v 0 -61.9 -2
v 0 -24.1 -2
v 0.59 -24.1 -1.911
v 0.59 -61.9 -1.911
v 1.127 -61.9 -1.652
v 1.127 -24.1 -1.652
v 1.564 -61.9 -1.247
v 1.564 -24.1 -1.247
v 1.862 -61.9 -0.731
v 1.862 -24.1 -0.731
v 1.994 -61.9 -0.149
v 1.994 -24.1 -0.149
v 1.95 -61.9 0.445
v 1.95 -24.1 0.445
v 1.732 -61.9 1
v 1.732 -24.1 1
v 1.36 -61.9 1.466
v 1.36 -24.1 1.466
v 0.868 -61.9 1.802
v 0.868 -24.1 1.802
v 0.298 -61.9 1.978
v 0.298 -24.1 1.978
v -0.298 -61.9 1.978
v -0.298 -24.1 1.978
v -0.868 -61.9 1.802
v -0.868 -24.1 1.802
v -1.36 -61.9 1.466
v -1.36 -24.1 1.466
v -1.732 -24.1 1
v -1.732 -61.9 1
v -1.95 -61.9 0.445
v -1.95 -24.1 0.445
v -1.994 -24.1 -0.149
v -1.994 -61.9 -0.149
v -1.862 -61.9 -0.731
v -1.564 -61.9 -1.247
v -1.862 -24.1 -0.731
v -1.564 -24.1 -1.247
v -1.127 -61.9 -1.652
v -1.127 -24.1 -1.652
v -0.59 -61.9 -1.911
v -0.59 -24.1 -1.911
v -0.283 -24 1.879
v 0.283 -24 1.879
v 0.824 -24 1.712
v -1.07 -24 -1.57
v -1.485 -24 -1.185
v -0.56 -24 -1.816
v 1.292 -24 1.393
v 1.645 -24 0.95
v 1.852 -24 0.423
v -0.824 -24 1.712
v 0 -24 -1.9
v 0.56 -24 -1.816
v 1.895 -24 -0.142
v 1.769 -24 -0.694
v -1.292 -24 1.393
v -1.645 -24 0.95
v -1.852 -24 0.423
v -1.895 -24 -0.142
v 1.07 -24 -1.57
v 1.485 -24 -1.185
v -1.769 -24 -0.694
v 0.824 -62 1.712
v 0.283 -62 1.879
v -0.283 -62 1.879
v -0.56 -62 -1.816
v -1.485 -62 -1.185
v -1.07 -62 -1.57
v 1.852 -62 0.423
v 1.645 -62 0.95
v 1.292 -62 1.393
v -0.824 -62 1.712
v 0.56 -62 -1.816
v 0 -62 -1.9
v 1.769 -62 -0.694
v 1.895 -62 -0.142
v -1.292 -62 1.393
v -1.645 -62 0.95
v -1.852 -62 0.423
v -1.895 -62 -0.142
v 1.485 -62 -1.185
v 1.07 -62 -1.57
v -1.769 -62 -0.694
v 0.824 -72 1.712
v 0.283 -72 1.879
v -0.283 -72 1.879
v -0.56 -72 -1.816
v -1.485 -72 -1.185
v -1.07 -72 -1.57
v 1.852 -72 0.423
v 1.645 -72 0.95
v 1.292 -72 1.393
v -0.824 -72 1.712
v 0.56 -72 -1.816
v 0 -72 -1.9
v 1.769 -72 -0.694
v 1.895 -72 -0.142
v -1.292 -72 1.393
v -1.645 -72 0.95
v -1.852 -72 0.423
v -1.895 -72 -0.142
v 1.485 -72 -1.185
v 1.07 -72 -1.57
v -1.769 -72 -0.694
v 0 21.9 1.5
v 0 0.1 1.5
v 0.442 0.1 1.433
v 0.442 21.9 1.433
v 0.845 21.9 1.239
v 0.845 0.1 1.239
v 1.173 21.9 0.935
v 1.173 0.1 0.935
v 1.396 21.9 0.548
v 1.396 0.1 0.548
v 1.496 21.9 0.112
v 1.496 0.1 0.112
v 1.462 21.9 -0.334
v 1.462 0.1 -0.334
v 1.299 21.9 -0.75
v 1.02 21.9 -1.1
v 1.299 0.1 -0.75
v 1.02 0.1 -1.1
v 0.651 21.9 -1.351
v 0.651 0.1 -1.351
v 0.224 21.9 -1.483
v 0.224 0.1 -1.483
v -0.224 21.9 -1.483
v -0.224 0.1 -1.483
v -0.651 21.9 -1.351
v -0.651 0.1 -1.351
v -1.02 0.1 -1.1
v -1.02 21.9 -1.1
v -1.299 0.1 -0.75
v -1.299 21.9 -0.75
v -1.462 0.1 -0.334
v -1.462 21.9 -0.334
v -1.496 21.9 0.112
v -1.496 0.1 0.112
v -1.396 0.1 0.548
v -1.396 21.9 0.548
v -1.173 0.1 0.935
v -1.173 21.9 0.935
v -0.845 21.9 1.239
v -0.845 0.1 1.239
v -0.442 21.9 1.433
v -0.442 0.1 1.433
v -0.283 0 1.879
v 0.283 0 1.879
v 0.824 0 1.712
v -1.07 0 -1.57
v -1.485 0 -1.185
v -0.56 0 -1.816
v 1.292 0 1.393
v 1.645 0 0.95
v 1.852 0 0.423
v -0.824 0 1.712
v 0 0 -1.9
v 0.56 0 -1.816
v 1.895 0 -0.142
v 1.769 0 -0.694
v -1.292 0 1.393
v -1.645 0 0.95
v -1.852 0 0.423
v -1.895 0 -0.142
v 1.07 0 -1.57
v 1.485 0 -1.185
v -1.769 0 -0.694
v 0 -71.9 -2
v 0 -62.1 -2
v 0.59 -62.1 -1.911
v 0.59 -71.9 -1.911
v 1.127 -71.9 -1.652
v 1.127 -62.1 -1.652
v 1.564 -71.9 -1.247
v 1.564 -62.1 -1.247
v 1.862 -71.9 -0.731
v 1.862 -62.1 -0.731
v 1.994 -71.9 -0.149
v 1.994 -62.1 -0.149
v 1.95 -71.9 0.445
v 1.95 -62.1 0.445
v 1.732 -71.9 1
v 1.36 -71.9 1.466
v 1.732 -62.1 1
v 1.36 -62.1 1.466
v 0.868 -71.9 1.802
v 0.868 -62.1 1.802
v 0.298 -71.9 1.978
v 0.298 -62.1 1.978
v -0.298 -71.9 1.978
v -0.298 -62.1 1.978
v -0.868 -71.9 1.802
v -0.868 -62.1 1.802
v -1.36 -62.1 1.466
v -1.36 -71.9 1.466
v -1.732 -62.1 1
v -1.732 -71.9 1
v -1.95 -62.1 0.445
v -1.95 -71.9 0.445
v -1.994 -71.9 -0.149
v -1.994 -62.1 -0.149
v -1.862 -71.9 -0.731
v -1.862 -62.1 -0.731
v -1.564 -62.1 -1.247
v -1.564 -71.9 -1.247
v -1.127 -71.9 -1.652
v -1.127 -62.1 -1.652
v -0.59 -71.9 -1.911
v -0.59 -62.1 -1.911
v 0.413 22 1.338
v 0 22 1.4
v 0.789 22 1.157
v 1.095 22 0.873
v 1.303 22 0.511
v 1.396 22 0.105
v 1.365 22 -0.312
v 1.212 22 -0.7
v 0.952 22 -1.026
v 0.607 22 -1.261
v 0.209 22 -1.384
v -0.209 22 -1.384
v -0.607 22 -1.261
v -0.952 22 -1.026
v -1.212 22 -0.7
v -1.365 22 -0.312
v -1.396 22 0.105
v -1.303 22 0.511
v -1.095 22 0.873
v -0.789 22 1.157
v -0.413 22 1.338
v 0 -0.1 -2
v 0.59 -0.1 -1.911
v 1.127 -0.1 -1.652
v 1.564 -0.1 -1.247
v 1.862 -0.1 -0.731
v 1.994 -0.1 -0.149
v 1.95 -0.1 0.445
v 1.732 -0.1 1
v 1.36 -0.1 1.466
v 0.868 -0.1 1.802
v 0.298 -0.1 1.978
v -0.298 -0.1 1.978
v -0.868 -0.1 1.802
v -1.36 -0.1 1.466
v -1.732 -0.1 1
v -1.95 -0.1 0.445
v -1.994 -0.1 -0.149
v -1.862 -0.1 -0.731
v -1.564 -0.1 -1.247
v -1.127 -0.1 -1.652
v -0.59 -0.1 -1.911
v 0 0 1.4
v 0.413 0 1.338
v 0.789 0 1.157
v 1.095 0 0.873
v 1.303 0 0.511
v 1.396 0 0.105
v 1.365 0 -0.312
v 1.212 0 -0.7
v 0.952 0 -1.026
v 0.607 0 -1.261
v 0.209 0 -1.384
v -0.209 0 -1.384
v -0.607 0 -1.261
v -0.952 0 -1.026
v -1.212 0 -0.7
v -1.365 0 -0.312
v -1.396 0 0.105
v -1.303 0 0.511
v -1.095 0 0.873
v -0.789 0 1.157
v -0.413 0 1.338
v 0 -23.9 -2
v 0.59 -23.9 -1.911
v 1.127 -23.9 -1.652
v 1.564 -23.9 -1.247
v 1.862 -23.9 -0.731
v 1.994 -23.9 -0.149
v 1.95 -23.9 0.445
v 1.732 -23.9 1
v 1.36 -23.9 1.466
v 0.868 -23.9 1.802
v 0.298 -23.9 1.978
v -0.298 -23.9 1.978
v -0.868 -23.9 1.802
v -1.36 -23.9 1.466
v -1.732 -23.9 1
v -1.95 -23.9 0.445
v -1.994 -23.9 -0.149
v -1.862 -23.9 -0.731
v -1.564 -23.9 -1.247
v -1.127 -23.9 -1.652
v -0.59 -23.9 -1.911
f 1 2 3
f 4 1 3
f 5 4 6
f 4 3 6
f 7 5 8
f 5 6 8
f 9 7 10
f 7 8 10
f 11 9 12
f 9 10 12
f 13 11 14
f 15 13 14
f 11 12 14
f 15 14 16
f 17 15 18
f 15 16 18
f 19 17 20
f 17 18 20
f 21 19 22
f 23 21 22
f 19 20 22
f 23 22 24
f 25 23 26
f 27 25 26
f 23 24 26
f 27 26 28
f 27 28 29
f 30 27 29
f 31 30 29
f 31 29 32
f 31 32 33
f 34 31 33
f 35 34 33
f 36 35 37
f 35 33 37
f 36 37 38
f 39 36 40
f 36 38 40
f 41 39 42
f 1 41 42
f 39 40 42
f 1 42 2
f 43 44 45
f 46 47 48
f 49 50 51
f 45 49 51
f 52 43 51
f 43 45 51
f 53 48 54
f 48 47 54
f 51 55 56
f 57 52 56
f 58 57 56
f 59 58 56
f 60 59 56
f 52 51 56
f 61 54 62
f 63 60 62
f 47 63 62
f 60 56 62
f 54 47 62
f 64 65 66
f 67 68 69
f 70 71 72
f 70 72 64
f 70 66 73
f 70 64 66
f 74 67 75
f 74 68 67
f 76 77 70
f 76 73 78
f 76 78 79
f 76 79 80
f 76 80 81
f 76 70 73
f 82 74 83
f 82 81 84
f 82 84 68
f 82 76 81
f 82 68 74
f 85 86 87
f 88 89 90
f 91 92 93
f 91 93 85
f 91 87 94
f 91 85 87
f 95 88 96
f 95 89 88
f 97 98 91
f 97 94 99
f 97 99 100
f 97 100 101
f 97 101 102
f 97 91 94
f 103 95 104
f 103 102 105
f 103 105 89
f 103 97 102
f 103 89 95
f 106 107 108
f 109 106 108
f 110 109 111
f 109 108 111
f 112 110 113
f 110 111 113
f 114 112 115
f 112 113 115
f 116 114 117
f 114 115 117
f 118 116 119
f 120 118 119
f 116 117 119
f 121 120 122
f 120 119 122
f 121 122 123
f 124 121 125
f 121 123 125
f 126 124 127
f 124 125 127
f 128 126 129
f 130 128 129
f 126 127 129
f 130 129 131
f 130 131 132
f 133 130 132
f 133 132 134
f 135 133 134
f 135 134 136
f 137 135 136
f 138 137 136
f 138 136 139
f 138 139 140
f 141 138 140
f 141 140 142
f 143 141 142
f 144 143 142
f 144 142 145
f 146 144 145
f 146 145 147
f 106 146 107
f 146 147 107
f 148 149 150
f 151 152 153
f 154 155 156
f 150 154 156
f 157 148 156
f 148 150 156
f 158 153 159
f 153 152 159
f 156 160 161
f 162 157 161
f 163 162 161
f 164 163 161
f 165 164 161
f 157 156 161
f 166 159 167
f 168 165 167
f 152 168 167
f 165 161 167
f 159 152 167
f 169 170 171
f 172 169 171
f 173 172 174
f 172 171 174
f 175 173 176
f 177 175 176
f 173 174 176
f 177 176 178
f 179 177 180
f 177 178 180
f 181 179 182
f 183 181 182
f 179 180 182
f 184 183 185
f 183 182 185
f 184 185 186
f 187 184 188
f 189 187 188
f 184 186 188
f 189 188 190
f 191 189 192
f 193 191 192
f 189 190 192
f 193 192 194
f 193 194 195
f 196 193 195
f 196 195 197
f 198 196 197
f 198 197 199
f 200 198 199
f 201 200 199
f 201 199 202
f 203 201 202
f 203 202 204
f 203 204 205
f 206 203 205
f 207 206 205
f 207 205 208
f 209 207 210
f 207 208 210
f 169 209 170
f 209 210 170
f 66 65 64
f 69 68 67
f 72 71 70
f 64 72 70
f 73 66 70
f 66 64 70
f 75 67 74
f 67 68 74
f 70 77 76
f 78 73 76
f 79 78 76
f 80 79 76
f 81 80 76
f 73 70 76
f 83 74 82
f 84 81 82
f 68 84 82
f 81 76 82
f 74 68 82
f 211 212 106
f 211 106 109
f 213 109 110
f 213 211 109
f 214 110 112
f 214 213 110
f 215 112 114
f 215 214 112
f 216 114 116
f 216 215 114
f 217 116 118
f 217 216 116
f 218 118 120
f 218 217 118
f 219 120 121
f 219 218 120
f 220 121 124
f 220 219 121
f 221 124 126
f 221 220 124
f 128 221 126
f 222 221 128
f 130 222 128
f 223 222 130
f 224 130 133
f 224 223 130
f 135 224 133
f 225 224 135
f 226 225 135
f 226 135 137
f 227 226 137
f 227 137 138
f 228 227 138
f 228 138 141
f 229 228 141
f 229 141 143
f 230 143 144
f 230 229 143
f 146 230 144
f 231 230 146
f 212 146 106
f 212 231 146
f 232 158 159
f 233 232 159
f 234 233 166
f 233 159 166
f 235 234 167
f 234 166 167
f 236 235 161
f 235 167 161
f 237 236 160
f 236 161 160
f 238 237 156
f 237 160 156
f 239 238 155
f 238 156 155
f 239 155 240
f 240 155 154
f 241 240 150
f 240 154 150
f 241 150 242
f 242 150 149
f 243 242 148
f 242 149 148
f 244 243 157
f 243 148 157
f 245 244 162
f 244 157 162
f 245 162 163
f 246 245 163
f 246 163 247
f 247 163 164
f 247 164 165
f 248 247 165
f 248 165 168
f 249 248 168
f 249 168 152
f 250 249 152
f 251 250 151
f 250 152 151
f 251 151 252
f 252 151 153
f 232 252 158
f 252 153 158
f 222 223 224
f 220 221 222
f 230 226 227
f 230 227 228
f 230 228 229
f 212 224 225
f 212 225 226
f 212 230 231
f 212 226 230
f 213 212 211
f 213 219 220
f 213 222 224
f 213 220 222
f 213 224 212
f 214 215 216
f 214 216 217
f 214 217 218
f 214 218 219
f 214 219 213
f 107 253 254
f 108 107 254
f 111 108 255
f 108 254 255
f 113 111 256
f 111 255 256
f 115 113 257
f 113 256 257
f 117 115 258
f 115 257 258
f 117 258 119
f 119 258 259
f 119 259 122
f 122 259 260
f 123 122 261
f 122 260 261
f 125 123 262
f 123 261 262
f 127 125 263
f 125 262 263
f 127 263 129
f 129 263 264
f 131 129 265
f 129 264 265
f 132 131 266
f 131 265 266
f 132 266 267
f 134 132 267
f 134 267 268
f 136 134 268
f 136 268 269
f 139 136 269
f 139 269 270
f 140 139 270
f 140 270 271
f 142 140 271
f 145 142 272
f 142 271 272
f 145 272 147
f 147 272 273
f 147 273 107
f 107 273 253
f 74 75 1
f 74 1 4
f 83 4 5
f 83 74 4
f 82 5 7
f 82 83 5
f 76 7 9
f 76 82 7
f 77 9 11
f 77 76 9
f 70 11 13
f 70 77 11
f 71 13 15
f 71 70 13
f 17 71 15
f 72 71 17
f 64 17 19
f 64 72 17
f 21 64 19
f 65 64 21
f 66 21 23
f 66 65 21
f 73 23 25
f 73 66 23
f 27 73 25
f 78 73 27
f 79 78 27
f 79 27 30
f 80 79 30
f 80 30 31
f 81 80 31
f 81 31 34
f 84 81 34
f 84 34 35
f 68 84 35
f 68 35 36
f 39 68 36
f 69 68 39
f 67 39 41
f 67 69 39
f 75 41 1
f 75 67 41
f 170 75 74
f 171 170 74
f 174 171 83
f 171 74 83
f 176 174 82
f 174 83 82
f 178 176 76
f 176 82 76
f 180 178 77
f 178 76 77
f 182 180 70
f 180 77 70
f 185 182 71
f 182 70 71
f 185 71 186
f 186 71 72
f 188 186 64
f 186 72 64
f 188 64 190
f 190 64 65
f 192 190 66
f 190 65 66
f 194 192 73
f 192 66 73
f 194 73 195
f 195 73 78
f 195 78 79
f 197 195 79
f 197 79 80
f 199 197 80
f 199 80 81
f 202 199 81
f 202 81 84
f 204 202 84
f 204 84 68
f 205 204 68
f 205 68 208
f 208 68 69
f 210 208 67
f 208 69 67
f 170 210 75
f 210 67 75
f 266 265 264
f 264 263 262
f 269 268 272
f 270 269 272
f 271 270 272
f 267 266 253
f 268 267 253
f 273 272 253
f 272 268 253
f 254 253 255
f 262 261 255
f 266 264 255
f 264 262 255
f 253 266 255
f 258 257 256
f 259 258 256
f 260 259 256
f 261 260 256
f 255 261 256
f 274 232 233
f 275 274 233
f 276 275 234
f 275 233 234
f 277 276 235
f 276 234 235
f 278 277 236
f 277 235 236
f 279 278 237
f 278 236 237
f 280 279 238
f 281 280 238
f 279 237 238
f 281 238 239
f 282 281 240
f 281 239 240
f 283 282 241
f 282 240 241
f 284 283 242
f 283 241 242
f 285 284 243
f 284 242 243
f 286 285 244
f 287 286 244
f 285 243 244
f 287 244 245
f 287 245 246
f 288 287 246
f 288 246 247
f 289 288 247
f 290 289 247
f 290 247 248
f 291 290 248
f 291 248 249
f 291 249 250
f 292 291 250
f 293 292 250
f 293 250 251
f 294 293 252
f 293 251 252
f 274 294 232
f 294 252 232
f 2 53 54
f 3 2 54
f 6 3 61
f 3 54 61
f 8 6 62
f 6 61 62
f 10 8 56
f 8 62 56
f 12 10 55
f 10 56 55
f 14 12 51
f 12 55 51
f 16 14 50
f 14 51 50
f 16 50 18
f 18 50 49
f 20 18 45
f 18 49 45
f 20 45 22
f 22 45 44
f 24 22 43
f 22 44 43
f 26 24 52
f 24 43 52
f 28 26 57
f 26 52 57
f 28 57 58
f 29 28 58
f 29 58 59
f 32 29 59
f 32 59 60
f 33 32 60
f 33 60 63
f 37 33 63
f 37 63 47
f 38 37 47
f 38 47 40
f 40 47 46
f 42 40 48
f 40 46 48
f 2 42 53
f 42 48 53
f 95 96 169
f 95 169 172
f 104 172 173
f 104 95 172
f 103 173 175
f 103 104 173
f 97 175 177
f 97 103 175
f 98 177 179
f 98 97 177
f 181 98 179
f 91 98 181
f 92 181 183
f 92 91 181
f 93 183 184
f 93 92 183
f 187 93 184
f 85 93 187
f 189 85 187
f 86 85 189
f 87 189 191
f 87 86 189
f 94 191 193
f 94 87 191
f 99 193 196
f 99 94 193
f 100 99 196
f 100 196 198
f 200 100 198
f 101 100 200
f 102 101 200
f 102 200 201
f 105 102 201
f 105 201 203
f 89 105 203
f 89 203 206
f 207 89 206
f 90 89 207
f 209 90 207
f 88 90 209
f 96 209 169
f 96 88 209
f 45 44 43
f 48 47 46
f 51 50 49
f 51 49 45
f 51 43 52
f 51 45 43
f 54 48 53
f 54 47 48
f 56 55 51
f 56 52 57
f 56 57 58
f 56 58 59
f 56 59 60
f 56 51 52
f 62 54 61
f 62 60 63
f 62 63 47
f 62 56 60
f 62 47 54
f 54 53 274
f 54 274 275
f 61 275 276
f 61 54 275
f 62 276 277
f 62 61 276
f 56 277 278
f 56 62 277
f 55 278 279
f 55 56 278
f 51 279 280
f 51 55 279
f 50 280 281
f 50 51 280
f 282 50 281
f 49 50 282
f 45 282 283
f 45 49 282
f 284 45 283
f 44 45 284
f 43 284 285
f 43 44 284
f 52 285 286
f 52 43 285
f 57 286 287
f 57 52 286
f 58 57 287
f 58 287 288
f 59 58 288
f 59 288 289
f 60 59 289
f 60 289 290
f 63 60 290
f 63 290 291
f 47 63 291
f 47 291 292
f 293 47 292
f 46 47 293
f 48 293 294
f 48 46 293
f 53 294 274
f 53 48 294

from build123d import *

# Parameters (mm, degrees)
SKETCH1_R           = 1.5
BOSS_EXTRUDE1_DEPTH = 22
SKETCH2_R           = 2
BOSS_EXTRUDE2_DEPTH = 24
SKETCH3_R           = 2
BOSS_EXTRUDE3_DEPTH = 38
SKETCH4_R           = 2
BOSS_EXTRUDE4_DEPTH = 10
CHAMFER1_SIZE       = 0.1
CHAMFER2_SIZE       = 0.1
CHAMFER3_SIZE       = 0.1
CHAMFER4_SIZE       = 0.1


with BuildPart() as part:
    # Sketch1 → Boss-Extrude1 (new body)
    with BuildSketch(Plane(origin=(0, 0, 0), x_dir=(1, 0, 0), z_dir=(0, 1, 0))):
        with Locations(Location((0, 0, 0), (0, 0, 270))):
            Circle(SKETCH1_R)
    extrude(amount=BOSS_EXTRUDE1_DEPTH)

    # Chamfer4
    chamfer4_edges = [part.edges().sort_by_distance(p)[0] for p in [
        (0, 0, -1.5),
        (0, 22, -1.5),
    ]]
    chamfer(chamfer4_edges, length=CHAMFER4_SIZE)


with BuildPart() as body_2:
    # Sketch2 → Boss-Extrude2 (new body)
    with BuildSketch(Plane.XZ):
        with Locations(Location((0, 0, 0), (0, 0, 270))):
            Circle(SKETCH2_R)
    extrude(amount=BOSS_EXTRUDE2_DEPTH)

    # Chamfer3
    chamfer3_edges = [body_2.edges().sort_by_distance(p)[0] for p in [
        (0, 0, 2),
        (0, -24, 2),
    ]]
    chamfer(chamfer3_edges, length=CHAMFER3_SIZE)


with BuildPart() as body_3:
    # Sketch3 → Boss-Extrude3 (new body)
    with BuildSketch(Plane.XZ.offset(24)):
        with Locations(Location((0, 0, 0), (0, 0, 270))):
            Circle(SKETCH3_R)
    extrude(amount=BOSS_EXTRUDE3_DEPTH)

    # Chamfer2
    chamfer2_edges = [body_3.edges().sort_by_distance(p)[0] for p in [
        (0, -24, 2),
        (0, -62, 2),
    ]]
    chamfer(chamfer2_edges, length=CHAMFER2_SIZE)


with BuildPart() as body_4:
    # Sketch4 → Boss-Extrude4 (new body)
    with BuildSketch(Plane.XZ.offset(62)):
        with Locations(Location((0, 0, 0), (0, 0, 270))):
            Circle(SKETCH4_R)
    extrude(amount=BOSS_EXTRUDE4_DEPTH)

    # Chamfer1
    chamfer1_edges = [body_4.edges().sort_by_distance(p)[0] for p in [
        (0, -62, 2),
        (0, -72, 2),
    ]]
    chamfer(chamfer1_edges, length=CHAMFER1_SIZE)


solid = Compound([part.part, body_2.part, body_3.part, body_4.part])
